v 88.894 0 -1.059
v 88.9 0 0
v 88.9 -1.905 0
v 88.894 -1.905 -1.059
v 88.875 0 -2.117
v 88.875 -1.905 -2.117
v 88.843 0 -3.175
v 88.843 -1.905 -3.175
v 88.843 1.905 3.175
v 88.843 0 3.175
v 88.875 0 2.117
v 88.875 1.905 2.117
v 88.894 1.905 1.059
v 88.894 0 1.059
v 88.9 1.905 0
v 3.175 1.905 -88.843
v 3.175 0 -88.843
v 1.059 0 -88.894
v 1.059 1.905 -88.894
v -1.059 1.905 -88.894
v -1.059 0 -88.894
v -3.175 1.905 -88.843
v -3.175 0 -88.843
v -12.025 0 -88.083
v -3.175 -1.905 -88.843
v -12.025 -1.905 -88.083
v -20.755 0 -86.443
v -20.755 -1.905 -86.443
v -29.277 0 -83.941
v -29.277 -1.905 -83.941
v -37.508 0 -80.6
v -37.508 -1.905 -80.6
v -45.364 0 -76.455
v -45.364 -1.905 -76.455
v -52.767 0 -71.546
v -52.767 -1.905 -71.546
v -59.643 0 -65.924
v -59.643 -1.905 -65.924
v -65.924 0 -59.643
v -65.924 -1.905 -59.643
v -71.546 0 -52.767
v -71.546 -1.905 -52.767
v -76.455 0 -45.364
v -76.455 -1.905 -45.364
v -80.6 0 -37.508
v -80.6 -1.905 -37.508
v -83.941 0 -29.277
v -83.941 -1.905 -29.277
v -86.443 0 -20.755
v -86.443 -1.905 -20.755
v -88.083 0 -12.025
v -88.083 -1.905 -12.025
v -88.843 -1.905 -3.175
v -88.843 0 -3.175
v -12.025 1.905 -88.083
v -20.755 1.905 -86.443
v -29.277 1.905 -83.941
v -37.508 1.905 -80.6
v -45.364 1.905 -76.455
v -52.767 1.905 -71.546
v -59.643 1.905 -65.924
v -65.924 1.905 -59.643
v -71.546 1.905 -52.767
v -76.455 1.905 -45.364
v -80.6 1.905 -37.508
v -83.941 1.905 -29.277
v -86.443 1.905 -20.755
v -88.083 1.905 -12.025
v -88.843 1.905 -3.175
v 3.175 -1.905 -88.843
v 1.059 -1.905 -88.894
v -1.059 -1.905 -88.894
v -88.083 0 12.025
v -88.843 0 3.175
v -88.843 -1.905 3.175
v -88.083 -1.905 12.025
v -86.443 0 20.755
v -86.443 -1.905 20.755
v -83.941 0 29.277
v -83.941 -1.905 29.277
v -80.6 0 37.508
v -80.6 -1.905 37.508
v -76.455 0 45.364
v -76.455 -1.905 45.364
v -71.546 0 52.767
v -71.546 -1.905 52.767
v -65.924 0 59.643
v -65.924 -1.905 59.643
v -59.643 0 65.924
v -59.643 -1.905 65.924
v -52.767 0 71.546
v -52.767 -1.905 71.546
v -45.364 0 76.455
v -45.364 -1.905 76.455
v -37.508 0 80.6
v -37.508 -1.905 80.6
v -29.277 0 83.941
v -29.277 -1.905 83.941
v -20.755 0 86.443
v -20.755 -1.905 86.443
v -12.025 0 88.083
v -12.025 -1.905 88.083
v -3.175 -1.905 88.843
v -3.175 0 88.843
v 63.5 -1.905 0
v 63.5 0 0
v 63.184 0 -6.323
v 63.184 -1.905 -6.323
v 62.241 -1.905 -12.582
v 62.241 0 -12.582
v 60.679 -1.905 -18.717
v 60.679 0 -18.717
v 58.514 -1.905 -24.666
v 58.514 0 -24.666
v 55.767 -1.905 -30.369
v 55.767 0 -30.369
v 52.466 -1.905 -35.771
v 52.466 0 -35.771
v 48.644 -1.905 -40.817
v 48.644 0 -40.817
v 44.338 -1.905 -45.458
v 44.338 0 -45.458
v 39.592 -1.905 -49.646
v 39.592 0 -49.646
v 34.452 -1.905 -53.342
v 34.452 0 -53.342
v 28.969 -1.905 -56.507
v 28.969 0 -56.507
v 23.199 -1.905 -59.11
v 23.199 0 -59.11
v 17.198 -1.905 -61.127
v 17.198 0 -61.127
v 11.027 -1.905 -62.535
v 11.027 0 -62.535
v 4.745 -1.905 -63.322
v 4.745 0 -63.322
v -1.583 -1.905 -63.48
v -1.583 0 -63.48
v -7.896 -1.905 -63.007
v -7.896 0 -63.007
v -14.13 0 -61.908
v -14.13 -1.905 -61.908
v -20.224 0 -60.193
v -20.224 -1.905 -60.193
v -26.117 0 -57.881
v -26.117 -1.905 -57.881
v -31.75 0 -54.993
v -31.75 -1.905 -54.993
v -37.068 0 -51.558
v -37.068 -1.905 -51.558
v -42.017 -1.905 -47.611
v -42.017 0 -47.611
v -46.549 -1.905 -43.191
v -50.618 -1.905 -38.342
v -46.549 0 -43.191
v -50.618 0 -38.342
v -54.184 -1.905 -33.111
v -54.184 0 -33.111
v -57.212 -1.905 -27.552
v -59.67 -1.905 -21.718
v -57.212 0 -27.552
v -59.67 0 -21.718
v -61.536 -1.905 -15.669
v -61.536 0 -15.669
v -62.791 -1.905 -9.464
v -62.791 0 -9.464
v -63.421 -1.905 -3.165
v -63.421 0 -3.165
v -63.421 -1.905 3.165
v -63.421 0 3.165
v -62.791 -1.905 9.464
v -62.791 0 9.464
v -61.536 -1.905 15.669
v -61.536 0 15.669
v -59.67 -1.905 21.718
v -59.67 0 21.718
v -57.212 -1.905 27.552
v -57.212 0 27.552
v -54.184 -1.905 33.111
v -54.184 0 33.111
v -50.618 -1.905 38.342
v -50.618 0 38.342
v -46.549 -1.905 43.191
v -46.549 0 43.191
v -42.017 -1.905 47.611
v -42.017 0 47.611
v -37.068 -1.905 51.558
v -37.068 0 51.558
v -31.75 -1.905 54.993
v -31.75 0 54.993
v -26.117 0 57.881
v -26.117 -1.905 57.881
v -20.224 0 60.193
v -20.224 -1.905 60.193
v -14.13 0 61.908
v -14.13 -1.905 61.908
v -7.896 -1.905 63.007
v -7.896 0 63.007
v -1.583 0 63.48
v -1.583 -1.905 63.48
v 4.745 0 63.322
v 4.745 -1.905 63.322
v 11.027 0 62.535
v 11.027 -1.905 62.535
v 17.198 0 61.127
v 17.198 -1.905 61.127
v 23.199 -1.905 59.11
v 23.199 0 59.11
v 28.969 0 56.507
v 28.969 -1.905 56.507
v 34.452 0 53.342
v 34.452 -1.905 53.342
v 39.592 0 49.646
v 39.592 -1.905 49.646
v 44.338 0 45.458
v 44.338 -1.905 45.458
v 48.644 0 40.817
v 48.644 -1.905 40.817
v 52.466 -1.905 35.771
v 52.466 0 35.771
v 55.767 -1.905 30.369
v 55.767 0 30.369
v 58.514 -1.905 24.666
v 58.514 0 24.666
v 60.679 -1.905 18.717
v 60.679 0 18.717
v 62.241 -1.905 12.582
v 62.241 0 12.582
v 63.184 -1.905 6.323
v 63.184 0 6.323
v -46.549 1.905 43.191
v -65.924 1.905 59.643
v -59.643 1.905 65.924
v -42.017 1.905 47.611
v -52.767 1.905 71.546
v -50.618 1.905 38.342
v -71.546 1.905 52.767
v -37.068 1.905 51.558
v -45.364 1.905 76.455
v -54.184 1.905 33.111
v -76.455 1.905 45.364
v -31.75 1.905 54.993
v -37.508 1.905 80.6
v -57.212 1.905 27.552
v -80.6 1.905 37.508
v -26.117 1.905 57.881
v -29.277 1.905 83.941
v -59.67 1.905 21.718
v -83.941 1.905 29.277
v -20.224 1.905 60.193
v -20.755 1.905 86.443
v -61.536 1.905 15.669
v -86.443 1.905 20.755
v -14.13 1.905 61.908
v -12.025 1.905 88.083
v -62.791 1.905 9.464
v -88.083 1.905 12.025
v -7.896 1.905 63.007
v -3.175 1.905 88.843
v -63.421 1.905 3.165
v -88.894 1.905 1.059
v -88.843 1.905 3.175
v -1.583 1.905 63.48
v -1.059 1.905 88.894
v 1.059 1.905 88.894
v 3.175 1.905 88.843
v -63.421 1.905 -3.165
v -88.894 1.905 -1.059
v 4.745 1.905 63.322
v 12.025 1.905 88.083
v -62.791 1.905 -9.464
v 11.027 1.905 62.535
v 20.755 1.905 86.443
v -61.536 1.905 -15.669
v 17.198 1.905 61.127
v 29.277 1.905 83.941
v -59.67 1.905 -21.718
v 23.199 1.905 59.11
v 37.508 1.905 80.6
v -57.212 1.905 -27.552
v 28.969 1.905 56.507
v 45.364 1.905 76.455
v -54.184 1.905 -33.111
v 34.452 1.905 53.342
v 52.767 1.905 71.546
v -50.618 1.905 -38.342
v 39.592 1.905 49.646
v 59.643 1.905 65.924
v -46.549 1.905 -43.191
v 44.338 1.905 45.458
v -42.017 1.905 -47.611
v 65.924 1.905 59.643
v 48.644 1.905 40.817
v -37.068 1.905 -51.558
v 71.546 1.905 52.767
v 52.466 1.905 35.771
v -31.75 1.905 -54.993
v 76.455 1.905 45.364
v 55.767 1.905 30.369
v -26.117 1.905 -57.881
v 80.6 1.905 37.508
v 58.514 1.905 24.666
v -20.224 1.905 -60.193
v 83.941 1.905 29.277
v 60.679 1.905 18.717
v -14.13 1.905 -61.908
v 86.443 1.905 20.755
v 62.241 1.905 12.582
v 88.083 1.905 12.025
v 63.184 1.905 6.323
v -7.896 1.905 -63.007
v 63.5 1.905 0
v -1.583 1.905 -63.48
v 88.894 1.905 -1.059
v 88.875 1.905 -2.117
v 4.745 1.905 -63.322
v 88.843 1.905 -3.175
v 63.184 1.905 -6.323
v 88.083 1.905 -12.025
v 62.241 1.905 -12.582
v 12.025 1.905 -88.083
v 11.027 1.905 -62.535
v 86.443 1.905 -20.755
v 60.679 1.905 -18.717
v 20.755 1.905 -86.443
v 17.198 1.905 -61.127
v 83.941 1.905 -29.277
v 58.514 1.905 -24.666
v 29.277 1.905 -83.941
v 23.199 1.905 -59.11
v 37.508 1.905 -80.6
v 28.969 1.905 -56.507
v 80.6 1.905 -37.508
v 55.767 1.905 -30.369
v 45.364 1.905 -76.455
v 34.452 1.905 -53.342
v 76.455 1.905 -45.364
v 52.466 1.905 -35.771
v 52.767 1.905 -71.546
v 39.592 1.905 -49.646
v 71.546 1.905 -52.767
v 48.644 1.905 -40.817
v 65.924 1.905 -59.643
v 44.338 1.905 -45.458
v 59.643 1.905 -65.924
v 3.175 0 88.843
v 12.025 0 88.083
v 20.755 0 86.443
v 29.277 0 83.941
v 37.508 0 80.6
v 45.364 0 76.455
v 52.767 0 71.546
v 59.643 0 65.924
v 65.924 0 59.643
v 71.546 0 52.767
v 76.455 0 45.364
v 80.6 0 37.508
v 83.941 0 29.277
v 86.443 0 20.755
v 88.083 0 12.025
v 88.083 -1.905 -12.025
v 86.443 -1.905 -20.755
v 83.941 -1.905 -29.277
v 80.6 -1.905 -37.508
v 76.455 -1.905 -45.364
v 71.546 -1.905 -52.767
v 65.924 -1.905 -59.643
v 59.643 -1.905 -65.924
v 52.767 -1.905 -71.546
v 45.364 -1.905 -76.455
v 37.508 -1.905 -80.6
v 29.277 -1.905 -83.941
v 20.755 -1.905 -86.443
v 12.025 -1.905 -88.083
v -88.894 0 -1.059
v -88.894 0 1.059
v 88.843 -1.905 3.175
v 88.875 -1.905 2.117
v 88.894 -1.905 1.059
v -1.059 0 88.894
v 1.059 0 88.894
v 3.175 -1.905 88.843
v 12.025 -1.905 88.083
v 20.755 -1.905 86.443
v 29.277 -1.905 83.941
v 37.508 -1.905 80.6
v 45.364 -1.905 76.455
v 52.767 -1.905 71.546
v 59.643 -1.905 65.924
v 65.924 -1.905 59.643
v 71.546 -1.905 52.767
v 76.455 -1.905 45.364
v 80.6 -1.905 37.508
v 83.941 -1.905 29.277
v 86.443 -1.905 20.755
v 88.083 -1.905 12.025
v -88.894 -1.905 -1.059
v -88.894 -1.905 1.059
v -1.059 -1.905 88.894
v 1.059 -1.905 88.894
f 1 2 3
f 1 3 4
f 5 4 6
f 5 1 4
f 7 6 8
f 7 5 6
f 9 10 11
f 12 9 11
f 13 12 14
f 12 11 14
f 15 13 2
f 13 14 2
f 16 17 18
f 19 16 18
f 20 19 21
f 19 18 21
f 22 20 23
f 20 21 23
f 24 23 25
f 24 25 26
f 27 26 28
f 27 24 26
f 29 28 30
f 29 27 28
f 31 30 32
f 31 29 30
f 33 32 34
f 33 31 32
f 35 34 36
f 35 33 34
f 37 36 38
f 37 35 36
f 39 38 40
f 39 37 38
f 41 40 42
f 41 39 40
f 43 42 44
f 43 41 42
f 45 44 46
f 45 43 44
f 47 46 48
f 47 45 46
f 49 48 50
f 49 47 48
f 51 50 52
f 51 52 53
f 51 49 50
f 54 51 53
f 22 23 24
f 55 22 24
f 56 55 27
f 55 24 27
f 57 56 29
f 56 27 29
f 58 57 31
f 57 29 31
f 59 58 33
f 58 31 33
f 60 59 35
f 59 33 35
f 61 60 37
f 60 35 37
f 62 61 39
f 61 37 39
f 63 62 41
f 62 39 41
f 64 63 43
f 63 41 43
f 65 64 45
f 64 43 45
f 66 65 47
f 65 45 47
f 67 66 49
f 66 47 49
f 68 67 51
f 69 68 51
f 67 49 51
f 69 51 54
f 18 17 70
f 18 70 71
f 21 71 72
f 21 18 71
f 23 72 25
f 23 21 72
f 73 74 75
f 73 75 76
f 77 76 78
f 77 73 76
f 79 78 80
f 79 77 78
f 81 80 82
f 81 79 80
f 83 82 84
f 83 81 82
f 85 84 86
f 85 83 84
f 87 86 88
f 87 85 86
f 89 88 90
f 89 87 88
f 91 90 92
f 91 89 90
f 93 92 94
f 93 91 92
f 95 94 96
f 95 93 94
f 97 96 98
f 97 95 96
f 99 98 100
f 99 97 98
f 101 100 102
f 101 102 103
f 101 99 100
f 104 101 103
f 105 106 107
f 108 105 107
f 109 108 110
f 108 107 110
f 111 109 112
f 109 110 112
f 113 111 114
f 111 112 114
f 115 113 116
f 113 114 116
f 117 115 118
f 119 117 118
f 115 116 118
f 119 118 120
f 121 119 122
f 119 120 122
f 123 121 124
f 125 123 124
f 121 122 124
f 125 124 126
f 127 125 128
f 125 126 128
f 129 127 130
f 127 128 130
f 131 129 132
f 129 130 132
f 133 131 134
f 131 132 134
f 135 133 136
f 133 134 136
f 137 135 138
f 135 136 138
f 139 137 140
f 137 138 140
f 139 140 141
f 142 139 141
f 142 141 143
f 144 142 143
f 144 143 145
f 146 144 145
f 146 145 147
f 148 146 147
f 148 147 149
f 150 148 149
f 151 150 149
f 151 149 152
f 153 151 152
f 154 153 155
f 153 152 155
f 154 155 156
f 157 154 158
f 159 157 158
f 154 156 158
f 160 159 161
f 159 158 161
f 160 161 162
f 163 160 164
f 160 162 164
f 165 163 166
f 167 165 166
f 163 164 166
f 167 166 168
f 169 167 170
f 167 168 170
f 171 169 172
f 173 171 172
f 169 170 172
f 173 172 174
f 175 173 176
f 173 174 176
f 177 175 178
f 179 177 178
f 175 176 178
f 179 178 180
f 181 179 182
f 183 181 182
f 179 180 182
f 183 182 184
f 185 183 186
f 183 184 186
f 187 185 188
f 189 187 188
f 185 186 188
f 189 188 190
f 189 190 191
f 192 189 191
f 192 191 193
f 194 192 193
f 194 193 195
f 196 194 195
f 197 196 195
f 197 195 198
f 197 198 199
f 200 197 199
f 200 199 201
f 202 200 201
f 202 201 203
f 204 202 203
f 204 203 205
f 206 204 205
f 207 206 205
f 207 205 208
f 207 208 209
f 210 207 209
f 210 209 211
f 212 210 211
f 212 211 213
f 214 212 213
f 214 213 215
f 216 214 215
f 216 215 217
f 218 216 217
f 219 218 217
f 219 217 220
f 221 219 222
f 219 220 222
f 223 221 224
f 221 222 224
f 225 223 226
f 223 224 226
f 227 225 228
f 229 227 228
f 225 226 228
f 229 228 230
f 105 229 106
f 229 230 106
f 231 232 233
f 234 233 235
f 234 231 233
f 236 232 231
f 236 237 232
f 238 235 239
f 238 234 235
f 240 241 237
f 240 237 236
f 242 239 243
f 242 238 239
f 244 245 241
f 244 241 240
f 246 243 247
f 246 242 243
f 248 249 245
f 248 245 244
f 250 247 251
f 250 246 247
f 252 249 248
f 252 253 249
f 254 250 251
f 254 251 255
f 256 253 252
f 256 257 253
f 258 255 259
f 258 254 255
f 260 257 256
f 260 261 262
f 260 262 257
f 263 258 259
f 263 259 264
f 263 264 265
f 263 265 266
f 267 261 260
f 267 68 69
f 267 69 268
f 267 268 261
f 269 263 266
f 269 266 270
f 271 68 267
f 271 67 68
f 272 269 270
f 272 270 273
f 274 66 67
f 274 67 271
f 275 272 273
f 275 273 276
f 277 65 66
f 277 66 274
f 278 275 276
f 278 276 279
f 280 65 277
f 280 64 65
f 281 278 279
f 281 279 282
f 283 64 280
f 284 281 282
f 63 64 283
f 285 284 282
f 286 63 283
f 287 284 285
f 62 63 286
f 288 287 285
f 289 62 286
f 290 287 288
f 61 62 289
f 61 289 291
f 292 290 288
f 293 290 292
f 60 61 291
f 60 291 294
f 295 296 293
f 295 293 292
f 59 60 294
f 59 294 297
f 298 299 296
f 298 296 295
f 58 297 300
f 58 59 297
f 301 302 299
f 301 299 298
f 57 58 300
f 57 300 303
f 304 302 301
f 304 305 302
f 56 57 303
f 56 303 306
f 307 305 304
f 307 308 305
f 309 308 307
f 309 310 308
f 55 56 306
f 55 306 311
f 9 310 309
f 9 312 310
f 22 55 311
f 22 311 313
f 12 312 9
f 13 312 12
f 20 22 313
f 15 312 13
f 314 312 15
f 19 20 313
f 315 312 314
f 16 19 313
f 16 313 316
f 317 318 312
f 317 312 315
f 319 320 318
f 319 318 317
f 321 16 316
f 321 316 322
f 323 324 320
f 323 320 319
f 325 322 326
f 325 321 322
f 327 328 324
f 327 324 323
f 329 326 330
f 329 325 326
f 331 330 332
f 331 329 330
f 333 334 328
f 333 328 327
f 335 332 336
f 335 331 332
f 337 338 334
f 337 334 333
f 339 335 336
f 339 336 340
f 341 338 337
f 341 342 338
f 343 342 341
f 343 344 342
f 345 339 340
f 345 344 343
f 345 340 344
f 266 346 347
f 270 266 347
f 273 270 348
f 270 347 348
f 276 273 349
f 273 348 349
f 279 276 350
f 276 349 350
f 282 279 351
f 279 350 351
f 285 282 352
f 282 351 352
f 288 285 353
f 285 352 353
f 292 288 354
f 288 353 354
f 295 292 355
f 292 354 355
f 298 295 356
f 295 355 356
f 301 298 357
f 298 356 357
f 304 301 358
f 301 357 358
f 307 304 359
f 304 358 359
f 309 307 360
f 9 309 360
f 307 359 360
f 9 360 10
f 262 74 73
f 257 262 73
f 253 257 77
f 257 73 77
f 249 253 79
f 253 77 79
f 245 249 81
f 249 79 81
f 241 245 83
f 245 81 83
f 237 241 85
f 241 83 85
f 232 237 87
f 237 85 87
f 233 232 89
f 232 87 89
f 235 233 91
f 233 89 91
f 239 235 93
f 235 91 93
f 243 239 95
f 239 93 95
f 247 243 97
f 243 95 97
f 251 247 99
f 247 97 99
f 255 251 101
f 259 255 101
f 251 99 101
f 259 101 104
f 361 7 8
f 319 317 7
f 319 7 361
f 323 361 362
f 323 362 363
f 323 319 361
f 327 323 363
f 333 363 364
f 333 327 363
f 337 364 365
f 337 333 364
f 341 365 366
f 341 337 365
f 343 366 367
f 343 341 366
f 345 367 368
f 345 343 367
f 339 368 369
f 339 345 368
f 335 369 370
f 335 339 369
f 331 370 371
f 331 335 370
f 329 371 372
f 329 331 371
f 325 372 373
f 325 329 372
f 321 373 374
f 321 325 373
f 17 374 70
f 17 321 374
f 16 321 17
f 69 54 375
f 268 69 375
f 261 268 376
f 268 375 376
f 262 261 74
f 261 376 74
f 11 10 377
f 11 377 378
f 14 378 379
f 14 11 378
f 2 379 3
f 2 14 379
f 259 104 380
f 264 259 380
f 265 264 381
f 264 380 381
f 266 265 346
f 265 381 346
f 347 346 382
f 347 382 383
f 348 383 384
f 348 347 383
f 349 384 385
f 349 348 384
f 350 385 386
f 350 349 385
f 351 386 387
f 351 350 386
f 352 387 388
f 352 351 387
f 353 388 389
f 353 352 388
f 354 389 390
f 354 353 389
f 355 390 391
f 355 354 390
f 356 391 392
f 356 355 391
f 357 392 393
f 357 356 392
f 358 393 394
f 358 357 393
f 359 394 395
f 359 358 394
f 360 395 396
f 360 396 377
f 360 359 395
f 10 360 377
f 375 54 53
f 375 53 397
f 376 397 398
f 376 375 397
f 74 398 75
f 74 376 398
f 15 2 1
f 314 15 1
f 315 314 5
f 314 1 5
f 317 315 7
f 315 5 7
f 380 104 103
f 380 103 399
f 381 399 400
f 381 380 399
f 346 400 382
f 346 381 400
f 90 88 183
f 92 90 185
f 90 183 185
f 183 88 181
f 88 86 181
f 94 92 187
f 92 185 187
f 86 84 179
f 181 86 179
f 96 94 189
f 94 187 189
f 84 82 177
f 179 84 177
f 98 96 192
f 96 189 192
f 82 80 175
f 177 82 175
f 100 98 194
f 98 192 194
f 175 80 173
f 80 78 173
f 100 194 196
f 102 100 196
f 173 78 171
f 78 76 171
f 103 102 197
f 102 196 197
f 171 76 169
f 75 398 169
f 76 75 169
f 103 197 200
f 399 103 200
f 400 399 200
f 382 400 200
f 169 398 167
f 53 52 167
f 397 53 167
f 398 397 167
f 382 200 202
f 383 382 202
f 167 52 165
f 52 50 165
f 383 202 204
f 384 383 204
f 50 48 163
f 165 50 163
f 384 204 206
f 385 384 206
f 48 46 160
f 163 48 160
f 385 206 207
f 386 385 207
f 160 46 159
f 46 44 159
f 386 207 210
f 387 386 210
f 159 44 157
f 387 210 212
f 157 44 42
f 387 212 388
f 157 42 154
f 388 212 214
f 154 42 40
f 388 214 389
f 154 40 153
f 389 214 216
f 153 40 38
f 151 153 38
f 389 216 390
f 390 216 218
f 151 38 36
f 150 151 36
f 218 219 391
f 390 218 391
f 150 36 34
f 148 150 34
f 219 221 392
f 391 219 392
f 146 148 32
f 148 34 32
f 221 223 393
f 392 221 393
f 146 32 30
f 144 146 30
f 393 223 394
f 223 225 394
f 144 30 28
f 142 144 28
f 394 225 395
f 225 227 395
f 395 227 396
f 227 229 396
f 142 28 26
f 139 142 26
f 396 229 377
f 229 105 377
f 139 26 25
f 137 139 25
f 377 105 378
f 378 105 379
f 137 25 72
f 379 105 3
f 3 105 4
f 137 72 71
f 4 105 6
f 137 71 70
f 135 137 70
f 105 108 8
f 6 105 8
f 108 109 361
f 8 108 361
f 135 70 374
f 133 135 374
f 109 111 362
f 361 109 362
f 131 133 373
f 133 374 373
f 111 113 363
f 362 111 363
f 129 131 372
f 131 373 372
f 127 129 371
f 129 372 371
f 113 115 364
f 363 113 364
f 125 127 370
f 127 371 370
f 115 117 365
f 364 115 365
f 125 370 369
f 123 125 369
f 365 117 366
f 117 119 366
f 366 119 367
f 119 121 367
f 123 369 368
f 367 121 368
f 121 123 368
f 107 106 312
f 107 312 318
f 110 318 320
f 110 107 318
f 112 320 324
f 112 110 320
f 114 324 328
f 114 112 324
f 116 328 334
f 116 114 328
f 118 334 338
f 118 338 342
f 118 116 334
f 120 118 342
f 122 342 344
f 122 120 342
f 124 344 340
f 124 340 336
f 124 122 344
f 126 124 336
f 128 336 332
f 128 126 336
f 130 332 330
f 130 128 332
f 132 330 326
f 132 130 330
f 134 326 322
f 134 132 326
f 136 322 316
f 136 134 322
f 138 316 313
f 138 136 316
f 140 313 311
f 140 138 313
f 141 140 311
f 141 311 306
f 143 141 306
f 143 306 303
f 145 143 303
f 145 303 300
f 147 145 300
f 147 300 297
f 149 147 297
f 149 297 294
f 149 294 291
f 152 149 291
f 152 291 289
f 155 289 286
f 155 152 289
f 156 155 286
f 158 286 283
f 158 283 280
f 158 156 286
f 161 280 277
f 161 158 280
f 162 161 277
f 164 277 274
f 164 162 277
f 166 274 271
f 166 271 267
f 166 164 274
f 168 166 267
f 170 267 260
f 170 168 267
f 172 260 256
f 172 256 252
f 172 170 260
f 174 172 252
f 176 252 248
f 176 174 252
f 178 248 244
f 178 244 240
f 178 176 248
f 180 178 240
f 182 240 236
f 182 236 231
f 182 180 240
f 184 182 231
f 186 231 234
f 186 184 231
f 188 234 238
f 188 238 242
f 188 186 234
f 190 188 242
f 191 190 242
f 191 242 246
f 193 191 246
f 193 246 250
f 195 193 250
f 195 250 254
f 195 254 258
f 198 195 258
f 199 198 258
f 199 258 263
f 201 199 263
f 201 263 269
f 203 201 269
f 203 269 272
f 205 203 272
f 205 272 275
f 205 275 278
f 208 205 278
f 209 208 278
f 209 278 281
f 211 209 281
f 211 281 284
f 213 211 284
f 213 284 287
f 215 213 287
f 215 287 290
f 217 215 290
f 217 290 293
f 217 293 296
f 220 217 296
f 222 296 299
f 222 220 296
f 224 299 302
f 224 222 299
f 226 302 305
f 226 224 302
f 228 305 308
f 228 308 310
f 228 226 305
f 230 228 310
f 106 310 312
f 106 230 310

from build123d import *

# Parameters (mm, degrees)
CENTERING_RING_EXTRUDE_DEPTH           = 1.905
CENTERING_RING_EXTRUDE_DEPTH_BACK      = 1.905
F_98MM_6ID_CENTERING_RING_SKETCH_7_R   = 88.9
F_98MM_6ID_CENTERING_RING_SKETCH_7_R_2 = 63.5


with BuildPart() as part:
    # 98mm - 6ID centering ring sketch_7 → Centering Ring Extrude (new, two sides: drawn at the far end of the back side and taken through both)
    with BuildSketch(Plane(origin=(0, 0, 0), x_dir=(1, 0, 0), z_dir=(0, 1, 0)).offset(-CENTERING_RING_EXTRUDE_DEPTH_BACK)):
        Circle(F_98MM_6ID_CENTERING_RING_SKETCH_7_R)
        Circle(F_98MM_6ID_CENTERING_RING_SKETCH_7_R_2, mode=Mode.SUBTRACT)
    extrude(amount=CENTERING_RING_EXTRUDE_DEPTH + CENTERING_RING_EXTRUDE_DEPTH_BACK)


solid = part.part
